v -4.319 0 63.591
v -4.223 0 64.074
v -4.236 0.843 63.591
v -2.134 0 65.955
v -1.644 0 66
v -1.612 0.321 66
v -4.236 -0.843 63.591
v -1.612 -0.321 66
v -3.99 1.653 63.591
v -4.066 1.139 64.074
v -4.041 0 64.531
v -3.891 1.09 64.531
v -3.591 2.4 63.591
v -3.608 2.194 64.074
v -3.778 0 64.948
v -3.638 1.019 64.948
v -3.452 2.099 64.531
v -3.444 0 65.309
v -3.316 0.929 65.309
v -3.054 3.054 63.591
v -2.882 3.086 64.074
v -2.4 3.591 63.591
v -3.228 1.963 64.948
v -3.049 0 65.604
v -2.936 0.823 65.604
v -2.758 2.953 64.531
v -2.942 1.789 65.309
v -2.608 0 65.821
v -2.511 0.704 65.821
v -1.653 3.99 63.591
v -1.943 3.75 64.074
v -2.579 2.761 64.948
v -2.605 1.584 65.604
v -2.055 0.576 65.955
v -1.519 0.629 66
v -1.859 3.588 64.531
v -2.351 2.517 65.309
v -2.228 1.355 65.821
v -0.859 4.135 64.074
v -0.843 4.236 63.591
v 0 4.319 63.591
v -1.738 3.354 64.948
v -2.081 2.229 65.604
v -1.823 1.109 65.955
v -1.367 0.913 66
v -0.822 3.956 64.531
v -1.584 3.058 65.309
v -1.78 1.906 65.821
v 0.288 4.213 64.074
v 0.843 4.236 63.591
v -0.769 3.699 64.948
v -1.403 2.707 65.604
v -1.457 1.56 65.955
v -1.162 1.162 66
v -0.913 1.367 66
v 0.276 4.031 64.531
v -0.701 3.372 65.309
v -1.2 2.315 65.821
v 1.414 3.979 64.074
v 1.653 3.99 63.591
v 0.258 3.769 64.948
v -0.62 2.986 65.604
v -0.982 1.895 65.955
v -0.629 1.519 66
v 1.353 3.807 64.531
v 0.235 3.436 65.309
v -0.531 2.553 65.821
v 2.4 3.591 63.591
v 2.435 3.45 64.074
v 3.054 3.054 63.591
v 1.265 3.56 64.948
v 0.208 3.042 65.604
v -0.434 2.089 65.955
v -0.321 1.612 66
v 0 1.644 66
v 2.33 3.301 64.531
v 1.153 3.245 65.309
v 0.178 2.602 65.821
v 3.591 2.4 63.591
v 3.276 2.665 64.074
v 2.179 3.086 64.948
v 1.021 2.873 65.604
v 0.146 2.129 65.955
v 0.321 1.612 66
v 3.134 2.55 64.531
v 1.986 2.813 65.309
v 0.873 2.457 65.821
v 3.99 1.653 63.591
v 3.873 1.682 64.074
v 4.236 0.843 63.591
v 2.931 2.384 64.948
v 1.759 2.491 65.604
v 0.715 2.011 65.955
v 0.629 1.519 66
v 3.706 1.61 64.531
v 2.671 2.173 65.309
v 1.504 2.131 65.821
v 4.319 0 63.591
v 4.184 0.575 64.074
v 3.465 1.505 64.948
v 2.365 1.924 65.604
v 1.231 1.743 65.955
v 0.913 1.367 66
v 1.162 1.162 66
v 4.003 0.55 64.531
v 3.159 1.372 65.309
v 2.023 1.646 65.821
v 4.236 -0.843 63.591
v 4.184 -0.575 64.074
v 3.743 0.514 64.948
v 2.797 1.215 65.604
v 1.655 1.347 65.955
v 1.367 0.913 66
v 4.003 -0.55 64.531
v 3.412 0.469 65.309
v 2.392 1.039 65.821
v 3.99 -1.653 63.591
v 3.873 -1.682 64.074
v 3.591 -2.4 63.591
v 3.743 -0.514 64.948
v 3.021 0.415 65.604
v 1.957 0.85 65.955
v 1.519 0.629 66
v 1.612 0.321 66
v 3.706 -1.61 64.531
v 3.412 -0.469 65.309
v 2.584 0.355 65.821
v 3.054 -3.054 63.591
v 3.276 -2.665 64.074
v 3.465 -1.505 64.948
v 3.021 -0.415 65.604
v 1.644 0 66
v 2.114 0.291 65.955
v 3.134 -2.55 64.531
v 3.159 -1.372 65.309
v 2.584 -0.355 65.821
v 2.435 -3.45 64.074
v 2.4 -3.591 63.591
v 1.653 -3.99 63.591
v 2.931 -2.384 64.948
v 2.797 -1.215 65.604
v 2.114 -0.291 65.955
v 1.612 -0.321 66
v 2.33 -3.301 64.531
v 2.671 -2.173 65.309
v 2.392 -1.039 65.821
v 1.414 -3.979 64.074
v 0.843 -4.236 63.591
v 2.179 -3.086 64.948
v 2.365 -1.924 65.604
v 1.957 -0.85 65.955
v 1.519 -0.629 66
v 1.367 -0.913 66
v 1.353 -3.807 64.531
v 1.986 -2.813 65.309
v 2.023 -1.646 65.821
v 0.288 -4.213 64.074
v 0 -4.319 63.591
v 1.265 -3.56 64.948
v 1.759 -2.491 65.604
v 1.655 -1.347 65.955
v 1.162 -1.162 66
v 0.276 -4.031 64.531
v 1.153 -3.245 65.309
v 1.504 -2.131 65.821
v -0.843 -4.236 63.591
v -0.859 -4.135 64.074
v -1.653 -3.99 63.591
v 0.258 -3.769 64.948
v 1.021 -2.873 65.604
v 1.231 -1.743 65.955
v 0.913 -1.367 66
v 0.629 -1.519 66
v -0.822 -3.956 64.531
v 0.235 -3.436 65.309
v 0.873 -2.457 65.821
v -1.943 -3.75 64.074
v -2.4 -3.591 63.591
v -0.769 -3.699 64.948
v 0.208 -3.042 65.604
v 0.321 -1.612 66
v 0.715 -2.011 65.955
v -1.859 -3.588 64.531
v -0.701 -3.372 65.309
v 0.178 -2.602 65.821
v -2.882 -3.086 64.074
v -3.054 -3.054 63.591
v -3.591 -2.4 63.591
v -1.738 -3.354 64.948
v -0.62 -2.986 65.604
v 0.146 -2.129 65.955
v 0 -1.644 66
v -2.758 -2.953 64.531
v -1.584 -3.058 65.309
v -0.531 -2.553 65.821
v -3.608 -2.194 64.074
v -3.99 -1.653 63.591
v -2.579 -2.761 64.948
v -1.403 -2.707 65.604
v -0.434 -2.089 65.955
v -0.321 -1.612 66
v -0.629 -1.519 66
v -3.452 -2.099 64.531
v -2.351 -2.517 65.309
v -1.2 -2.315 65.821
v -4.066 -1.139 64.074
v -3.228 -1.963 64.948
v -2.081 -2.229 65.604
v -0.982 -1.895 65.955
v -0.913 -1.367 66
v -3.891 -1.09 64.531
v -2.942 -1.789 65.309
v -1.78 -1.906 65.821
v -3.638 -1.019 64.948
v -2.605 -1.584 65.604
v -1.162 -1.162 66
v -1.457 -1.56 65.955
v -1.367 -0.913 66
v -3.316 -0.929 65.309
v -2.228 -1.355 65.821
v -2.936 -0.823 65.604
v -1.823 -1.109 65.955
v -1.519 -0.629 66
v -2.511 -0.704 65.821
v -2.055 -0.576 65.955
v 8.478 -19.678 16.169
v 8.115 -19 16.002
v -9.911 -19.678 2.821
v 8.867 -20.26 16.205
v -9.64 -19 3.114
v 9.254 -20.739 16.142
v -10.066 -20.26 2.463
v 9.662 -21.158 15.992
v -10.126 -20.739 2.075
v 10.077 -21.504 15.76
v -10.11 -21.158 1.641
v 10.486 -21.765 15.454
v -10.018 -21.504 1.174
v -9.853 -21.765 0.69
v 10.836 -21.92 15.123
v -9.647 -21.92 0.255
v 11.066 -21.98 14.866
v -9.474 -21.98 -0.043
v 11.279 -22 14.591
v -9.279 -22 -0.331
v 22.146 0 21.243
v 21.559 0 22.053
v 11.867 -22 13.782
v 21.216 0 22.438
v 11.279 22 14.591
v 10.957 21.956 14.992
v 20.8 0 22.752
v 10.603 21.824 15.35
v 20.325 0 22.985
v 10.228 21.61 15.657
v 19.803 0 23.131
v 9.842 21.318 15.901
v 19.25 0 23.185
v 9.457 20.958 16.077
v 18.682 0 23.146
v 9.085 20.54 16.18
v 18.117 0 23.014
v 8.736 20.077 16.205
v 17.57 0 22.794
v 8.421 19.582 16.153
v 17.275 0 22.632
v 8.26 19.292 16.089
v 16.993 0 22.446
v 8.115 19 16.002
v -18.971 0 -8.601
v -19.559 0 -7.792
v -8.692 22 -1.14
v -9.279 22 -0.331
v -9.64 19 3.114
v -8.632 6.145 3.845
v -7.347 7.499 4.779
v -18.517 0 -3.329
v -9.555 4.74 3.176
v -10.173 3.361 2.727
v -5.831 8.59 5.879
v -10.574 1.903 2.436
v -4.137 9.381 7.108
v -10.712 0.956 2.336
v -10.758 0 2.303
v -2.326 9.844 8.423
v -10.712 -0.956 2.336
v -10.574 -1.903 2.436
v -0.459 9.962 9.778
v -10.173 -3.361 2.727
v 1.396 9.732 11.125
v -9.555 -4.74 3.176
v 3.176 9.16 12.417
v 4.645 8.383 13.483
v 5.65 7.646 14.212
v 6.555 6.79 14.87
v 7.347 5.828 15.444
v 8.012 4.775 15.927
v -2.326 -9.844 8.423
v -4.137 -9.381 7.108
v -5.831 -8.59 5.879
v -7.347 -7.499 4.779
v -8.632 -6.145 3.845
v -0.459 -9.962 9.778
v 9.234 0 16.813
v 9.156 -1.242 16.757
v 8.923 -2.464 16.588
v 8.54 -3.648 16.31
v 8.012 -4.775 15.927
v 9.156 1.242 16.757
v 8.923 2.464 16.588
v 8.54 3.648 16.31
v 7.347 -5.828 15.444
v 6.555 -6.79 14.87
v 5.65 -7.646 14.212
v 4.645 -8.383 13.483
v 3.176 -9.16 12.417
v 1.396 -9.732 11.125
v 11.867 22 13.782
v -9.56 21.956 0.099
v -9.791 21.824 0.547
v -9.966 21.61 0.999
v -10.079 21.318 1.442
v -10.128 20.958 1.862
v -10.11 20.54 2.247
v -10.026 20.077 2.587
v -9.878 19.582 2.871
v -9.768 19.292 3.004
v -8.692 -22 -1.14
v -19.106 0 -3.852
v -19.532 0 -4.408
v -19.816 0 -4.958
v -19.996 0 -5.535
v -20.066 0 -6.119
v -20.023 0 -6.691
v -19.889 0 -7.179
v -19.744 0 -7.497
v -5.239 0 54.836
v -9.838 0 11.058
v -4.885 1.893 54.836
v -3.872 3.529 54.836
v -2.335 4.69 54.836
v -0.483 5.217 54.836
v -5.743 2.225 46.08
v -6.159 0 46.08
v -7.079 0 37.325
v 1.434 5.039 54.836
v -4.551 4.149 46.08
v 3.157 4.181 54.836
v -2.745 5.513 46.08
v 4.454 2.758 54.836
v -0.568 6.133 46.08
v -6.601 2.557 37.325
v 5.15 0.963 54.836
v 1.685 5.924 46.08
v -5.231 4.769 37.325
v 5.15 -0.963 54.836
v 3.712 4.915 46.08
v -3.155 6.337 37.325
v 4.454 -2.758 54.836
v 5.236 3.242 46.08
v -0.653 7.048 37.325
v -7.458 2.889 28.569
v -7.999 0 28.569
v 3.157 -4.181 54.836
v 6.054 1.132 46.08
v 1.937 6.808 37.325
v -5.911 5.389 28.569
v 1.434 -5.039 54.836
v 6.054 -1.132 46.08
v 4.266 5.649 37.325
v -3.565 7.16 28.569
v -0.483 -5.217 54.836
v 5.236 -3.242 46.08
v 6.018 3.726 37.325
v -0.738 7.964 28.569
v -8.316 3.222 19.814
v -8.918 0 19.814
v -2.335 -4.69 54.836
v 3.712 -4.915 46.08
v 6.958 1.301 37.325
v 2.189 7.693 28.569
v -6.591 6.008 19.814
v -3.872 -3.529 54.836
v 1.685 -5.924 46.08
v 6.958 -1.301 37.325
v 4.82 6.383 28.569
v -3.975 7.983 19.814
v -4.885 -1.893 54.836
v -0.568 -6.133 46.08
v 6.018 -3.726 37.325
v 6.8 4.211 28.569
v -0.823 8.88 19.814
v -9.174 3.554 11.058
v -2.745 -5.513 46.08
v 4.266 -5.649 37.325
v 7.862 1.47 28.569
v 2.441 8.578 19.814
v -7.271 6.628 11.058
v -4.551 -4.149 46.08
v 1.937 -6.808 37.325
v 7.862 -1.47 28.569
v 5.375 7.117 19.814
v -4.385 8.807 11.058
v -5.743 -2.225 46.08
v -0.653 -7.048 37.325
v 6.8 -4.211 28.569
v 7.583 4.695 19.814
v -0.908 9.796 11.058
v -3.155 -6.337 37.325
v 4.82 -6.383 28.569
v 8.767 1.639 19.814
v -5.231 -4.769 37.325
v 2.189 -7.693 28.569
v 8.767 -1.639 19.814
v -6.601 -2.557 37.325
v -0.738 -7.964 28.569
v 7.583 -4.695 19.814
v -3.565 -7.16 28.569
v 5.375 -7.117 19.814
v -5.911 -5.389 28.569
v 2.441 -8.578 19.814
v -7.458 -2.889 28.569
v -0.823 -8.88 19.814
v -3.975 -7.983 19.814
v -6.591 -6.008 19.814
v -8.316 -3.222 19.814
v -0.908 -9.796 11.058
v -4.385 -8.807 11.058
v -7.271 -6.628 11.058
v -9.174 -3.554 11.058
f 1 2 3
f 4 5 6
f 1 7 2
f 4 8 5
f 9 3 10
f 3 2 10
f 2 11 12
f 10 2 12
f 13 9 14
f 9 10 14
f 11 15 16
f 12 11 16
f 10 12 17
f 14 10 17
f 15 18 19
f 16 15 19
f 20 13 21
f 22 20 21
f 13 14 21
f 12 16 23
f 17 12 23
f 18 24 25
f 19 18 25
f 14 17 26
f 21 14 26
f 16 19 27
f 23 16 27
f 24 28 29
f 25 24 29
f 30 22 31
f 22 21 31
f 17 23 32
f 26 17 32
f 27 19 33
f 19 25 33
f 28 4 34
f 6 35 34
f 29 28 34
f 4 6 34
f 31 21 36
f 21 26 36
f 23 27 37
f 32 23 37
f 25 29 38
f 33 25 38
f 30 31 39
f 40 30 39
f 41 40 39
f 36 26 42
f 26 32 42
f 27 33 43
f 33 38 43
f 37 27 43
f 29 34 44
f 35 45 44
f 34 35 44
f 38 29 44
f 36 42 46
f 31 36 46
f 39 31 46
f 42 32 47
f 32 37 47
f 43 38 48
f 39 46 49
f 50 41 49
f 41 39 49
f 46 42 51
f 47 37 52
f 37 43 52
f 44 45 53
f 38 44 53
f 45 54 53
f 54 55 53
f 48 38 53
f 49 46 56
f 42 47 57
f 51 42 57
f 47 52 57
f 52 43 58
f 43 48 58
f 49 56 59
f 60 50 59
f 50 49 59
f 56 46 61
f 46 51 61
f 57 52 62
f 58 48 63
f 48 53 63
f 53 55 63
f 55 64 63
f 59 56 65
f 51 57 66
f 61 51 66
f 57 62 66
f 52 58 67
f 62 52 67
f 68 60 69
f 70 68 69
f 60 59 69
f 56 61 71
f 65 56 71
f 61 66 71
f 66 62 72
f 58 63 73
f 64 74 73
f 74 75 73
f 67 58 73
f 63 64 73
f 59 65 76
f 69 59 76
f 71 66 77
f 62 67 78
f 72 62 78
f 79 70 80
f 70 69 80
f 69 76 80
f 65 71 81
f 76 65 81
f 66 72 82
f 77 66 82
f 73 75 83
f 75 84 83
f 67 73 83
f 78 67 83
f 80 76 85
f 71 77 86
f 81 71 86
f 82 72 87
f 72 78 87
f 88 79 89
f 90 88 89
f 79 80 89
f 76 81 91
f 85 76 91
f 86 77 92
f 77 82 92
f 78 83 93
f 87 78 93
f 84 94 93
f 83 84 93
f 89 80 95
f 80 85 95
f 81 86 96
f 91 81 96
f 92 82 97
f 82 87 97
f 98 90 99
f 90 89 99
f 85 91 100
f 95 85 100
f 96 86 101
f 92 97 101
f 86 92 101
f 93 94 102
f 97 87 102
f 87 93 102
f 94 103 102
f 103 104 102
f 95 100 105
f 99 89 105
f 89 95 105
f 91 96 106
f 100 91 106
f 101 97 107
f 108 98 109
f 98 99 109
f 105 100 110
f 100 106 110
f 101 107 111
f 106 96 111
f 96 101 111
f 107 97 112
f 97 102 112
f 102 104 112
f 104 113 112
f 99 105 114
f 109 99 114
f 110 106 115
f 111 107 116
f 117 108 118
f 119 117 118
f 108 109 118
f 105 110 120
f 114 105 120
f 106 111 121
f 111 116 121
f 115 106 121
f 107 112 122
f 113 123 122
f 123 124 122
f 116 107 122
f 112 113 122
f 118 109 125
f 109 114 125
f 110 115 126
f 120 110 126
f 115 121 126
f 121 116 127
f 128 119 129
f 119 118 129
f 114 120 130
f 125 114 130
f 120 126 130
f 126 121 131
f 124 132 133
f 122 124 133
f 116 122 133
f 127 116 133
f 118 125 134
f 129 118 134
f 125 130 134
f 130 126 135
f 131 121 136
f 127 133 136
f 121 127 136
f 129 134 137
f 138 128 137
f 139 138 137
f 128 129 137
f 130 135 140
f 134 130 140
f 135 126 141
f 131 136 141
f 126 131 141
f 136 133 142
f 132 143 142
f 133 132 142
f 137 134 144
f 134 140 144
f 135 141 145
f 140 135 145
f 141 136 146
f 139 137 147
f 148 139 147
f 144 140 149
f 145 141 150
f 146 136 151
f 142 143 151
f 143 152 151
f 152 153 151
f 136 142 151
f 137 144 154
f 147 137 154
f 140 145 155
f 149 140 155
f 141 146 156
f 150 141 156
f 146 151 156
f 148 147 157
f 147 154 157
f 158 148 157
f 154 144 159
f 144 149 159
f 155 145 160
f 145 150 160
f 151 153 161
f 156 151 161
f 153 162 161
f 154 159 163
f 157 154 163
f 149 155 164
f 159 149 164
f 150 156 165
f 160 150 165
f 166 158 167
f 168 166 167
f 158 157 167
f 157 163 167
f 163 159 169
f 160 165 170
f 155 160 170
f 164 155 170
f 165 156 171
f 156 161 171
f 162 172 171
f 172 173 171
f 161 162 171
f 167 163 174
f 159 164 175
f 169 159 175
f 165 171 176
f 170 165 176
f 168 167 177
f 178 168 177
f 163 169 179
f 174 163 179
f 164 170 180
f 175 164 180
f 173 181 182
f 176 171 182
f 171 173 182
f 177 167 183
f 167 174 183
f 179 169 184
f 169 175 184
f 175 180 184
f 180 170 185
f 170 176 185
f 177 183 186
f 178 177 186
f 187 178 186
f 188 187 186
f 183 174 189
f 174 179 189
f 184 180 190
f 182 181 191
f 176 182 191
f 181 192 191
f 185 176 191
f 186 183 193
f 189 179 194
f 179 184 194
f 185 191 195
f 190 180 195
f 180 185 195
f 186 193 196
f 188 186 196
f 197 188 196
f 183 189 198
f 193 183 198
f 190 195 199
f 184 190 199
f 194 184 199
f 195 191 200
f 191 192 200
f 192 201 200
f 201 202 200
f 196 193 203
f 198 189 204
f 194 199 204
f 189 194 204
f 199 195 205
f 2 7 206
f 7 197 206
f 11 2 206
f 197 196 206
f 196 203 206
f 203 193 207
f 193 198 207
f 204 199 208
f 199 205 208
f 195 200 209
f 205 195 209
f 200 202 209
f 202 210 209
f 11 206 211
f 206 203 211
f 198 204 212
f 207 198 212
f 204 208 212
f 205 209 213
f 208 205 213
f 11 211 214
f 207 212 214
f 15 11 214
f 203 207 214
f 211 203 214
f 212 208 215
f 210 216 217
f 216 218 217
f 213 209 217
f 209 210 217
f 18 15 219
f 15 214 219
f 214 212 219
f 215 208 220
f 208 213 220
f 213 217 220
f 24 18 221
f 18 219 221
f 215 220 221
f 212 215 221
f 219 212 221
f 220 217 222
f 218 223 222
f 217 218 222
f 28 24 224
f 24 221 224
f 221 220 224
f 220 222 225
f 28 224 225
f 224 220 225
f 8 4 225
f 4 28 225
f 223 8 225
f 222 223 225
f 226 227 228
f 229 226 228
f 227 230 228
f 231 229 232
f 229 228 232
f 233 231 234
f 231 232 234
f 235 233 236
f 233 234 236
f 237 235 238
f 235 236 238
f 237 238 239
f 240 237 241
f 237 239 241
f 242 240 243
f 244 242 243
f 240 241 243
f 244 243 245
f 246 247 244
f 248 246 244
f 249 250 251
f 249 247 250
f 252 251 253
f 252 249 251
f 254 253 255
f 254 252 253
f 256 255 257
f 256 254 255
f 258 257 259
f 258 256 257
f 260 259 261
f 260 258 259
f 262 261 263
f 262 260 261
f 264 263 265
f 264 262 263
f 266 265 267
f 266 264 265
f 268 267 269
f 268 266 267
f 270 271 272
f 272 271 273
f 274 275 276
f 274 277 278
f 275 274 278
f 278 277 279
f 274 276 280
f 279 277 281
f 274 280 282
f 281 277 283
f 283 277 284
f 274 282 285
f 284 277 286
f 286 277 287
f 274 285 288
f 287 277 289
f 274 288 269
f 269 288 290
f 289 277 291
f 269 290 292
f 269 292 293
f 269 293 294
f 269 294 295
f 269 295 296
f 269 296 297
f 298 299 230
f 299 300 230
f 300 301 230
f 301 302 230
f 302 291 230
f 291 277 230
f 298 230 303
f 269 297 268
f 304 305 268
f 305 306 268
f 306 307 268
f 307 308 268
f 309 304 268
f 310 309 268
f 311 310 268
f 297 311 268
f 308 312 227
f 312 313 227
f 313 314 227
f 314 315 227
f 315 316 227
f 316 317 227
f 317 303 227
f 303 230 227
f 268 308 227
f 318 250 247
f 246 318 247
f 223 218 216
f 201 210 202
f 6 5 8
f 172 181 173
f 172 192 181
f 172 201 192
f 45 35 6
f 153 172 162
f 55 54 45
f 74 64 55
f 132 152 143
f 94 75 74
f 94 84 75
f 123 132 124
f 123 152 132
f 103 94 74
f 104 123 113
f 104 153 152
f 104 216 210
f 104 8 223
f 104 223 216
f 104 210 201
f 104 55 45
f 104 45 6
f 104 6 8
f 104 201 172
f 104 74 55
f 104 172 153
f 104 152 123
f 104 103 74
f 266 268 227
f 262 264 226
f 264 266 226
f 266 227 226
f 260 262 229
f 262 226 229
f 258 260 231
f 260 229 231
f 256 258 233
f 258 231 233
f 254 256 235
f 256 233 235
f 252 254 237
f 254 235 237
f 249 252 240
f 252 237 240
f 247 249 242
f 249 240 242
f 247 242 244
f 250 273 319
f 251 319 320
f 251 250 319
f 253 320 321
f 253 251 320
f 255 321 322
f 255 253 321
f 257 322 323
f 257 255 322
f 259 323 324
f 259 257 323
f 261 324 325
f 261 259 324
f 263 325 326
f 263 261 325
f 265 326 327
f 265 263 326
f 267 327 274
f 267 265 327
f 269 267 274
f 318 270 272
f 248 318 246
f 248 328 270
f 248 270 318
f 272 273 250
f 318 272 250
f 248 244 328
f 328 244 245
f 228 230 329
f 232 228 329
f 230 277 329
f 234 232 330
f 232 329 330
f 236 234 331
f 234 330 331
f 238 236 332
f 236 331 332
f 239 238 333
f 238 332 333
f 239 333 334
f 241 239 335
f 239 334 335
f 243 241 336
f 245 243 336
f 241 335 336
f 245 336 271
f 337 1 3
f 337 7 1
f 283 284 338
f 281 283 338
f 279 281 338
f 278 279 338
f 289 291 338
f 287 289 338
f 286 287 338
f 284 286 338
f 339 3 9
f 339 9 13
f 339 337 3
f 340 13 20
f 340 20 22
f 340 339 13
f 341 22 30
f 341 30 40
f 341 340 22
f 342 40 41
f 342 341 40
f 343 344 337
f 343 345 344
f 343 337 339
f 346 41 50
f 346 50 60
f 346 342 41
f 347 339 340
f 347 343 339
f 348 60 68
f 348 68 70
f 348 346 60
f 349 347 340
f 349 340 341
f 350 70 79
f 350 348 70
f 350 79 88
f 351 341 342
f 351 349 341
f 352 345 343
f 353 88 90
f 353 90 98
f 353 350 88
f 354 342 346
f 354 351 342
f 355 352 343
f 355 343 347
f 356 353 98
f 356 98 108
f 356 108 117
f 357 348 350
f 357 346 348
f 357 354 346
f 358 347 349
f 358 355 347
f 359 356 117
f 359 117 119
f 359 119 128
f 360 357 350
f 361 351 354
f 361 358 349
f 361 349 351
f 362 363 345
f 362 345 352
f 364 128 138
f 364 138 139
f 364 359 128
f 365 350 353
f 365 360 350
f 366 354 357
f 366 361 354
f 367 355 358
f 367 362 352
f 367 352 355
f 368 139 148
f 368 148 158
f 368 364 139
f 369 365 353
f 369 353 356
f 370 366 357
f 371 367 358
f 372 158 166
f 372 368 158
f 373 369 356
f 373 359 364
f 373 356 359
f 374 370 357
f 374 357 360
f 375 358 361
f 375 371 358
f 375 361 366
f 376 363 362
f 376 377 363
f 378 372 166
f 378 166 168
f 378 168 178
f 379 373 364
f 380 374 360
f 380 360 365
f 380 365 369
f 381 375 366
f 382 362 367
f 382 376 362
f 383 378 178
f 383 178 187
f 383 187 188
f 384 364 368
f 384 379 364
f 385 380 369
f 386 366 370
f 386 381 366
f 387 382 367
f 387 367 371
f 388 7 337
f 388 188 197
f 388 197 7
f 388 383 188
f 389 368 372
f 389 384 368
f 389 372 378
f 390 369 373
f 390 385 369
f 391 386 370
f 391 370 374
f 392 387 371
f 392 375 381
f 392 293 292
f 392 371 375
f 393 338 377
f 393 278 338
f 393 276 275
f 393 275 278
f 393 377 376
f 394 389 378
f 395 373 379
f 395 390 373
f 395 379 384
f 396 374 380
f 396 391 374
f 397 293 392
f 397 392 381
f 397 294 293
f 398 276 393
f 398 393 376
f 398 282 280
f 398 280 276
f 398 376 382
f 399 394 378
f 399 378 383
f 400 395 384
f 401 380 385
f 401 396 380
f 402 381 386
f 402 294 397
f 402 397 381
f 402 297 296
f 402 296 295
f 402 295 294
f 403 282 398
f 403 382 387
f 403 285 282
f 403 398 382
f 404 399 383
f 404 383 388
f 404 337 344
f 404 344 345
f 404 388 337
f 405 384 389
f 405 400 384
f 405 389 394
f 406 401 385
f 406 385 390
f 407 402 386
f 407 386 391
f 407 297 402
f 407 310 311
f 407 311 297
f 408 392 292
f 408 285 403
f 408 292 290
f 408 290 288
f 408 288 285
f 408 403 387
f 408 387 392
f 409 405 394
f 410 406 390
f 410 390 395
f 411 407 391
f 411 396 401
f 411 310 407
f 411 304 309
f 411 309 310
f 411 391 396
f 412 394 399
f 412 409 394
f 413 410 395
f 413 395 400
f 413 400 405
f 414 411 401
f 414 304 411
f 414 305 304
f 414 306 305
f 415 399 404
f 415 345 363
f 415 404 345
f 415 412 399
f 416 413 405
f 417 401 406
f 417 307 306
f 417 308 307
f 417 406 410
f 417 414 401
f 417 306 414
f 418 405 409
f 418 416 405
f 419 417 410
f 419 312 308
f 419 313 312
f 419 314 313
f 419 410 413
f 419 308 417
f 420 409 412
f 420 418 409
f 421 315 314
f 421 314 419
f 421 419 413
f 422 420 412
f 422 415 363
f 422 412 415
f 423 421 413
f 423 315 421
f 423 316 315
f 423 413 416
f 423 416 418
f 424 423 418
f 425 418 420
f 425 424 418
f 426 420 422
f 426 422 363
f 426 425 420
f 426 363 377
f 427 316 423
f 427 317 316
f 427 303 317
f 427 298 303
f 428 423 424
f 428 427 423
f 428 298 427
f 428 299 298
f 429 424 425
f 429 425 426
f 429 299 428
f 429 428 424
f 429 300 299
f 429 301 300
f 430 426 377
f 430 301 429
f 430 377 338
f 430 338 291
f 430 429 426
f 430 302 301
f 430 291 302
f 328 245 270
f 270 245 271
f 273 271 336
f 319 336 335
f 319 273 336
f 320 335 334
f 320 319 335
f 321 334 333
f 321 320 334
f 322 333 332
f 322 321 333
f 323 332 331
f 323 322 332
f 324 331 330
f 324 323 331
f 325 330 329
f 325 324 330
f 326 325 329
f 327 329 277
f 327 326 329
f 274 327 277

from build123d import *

# Parameters (mm, degrees)
F3_DEPTH      = 11.001
F3_DEPTH_BACK = 11.001
F5_DEPTH      = 4
F6_R          = 3
F7_R          = 2.69


with BuildPart() as f1:
    # F0 (on Front) → F1 (revolve)
    with BuildSketch(Plane.XZ):
        Polygon((-4.066010414, 66), (-11, 0), (0, 0), (0, 66), align=None)
    revolve(axis=Axis((0, 0, 33), (0, 0, -1)))

    # F2 (on Front) → F3 (cut, two sides)
    with BuildSketch(Plane.XZ) as f3_sk:
        Polygon((40.7802015543, 39.7115387022), (-13.9303933829, 0), (40.7802015543, 0), align=None)
    extrude(amount=-F3_DEPTH, mode=Mode.SUBTRACT)
    extrude(f3_sk.sketch, amount=F3_DEPTH_BACK, mode=Mode.SUBTRACT)

    # F4 (on face) → F5 (join)
    with BuildSketch(Plane(origin=(-4.8068030747, 0, 6.6223335725), x_dir=(0.8092844528, 0, 0.5874169511), z_dir=(0.5874169511, 0, -0.8092844528))):
        Polygon((-7.7040281941, -22), (17.6993836503, -22), (30.4010895725, 0), (17.6993836503, 22), (-7.7040281941, 22), (-20.4057341162, 0), align=None)
    extrude(amount=F5_DEPTH)

    # F6
    f6_edges = [f1.edges().sort_by_distance(p)[0] for p in [
        (-0.76226, 22, 9.558054),
        (14.65668, 11, 20.74985),
        (14.65668, -11, 20.74985),
        (-0.76226, -22, 9.558054),
        (-16.1812, -11, -1.633742),
        (-16.1812, 11, -1.633742),
    ]]
    fillet(f6_edges, radius=F6_R)

    # F7
    f7_edges = [f1.edges().sort_by_distance(p)[0] for p in [
        (4.06601, 0, 66),
    ]]
    fillet(f7_edges, radius=F7_R)


solid = f1.part
